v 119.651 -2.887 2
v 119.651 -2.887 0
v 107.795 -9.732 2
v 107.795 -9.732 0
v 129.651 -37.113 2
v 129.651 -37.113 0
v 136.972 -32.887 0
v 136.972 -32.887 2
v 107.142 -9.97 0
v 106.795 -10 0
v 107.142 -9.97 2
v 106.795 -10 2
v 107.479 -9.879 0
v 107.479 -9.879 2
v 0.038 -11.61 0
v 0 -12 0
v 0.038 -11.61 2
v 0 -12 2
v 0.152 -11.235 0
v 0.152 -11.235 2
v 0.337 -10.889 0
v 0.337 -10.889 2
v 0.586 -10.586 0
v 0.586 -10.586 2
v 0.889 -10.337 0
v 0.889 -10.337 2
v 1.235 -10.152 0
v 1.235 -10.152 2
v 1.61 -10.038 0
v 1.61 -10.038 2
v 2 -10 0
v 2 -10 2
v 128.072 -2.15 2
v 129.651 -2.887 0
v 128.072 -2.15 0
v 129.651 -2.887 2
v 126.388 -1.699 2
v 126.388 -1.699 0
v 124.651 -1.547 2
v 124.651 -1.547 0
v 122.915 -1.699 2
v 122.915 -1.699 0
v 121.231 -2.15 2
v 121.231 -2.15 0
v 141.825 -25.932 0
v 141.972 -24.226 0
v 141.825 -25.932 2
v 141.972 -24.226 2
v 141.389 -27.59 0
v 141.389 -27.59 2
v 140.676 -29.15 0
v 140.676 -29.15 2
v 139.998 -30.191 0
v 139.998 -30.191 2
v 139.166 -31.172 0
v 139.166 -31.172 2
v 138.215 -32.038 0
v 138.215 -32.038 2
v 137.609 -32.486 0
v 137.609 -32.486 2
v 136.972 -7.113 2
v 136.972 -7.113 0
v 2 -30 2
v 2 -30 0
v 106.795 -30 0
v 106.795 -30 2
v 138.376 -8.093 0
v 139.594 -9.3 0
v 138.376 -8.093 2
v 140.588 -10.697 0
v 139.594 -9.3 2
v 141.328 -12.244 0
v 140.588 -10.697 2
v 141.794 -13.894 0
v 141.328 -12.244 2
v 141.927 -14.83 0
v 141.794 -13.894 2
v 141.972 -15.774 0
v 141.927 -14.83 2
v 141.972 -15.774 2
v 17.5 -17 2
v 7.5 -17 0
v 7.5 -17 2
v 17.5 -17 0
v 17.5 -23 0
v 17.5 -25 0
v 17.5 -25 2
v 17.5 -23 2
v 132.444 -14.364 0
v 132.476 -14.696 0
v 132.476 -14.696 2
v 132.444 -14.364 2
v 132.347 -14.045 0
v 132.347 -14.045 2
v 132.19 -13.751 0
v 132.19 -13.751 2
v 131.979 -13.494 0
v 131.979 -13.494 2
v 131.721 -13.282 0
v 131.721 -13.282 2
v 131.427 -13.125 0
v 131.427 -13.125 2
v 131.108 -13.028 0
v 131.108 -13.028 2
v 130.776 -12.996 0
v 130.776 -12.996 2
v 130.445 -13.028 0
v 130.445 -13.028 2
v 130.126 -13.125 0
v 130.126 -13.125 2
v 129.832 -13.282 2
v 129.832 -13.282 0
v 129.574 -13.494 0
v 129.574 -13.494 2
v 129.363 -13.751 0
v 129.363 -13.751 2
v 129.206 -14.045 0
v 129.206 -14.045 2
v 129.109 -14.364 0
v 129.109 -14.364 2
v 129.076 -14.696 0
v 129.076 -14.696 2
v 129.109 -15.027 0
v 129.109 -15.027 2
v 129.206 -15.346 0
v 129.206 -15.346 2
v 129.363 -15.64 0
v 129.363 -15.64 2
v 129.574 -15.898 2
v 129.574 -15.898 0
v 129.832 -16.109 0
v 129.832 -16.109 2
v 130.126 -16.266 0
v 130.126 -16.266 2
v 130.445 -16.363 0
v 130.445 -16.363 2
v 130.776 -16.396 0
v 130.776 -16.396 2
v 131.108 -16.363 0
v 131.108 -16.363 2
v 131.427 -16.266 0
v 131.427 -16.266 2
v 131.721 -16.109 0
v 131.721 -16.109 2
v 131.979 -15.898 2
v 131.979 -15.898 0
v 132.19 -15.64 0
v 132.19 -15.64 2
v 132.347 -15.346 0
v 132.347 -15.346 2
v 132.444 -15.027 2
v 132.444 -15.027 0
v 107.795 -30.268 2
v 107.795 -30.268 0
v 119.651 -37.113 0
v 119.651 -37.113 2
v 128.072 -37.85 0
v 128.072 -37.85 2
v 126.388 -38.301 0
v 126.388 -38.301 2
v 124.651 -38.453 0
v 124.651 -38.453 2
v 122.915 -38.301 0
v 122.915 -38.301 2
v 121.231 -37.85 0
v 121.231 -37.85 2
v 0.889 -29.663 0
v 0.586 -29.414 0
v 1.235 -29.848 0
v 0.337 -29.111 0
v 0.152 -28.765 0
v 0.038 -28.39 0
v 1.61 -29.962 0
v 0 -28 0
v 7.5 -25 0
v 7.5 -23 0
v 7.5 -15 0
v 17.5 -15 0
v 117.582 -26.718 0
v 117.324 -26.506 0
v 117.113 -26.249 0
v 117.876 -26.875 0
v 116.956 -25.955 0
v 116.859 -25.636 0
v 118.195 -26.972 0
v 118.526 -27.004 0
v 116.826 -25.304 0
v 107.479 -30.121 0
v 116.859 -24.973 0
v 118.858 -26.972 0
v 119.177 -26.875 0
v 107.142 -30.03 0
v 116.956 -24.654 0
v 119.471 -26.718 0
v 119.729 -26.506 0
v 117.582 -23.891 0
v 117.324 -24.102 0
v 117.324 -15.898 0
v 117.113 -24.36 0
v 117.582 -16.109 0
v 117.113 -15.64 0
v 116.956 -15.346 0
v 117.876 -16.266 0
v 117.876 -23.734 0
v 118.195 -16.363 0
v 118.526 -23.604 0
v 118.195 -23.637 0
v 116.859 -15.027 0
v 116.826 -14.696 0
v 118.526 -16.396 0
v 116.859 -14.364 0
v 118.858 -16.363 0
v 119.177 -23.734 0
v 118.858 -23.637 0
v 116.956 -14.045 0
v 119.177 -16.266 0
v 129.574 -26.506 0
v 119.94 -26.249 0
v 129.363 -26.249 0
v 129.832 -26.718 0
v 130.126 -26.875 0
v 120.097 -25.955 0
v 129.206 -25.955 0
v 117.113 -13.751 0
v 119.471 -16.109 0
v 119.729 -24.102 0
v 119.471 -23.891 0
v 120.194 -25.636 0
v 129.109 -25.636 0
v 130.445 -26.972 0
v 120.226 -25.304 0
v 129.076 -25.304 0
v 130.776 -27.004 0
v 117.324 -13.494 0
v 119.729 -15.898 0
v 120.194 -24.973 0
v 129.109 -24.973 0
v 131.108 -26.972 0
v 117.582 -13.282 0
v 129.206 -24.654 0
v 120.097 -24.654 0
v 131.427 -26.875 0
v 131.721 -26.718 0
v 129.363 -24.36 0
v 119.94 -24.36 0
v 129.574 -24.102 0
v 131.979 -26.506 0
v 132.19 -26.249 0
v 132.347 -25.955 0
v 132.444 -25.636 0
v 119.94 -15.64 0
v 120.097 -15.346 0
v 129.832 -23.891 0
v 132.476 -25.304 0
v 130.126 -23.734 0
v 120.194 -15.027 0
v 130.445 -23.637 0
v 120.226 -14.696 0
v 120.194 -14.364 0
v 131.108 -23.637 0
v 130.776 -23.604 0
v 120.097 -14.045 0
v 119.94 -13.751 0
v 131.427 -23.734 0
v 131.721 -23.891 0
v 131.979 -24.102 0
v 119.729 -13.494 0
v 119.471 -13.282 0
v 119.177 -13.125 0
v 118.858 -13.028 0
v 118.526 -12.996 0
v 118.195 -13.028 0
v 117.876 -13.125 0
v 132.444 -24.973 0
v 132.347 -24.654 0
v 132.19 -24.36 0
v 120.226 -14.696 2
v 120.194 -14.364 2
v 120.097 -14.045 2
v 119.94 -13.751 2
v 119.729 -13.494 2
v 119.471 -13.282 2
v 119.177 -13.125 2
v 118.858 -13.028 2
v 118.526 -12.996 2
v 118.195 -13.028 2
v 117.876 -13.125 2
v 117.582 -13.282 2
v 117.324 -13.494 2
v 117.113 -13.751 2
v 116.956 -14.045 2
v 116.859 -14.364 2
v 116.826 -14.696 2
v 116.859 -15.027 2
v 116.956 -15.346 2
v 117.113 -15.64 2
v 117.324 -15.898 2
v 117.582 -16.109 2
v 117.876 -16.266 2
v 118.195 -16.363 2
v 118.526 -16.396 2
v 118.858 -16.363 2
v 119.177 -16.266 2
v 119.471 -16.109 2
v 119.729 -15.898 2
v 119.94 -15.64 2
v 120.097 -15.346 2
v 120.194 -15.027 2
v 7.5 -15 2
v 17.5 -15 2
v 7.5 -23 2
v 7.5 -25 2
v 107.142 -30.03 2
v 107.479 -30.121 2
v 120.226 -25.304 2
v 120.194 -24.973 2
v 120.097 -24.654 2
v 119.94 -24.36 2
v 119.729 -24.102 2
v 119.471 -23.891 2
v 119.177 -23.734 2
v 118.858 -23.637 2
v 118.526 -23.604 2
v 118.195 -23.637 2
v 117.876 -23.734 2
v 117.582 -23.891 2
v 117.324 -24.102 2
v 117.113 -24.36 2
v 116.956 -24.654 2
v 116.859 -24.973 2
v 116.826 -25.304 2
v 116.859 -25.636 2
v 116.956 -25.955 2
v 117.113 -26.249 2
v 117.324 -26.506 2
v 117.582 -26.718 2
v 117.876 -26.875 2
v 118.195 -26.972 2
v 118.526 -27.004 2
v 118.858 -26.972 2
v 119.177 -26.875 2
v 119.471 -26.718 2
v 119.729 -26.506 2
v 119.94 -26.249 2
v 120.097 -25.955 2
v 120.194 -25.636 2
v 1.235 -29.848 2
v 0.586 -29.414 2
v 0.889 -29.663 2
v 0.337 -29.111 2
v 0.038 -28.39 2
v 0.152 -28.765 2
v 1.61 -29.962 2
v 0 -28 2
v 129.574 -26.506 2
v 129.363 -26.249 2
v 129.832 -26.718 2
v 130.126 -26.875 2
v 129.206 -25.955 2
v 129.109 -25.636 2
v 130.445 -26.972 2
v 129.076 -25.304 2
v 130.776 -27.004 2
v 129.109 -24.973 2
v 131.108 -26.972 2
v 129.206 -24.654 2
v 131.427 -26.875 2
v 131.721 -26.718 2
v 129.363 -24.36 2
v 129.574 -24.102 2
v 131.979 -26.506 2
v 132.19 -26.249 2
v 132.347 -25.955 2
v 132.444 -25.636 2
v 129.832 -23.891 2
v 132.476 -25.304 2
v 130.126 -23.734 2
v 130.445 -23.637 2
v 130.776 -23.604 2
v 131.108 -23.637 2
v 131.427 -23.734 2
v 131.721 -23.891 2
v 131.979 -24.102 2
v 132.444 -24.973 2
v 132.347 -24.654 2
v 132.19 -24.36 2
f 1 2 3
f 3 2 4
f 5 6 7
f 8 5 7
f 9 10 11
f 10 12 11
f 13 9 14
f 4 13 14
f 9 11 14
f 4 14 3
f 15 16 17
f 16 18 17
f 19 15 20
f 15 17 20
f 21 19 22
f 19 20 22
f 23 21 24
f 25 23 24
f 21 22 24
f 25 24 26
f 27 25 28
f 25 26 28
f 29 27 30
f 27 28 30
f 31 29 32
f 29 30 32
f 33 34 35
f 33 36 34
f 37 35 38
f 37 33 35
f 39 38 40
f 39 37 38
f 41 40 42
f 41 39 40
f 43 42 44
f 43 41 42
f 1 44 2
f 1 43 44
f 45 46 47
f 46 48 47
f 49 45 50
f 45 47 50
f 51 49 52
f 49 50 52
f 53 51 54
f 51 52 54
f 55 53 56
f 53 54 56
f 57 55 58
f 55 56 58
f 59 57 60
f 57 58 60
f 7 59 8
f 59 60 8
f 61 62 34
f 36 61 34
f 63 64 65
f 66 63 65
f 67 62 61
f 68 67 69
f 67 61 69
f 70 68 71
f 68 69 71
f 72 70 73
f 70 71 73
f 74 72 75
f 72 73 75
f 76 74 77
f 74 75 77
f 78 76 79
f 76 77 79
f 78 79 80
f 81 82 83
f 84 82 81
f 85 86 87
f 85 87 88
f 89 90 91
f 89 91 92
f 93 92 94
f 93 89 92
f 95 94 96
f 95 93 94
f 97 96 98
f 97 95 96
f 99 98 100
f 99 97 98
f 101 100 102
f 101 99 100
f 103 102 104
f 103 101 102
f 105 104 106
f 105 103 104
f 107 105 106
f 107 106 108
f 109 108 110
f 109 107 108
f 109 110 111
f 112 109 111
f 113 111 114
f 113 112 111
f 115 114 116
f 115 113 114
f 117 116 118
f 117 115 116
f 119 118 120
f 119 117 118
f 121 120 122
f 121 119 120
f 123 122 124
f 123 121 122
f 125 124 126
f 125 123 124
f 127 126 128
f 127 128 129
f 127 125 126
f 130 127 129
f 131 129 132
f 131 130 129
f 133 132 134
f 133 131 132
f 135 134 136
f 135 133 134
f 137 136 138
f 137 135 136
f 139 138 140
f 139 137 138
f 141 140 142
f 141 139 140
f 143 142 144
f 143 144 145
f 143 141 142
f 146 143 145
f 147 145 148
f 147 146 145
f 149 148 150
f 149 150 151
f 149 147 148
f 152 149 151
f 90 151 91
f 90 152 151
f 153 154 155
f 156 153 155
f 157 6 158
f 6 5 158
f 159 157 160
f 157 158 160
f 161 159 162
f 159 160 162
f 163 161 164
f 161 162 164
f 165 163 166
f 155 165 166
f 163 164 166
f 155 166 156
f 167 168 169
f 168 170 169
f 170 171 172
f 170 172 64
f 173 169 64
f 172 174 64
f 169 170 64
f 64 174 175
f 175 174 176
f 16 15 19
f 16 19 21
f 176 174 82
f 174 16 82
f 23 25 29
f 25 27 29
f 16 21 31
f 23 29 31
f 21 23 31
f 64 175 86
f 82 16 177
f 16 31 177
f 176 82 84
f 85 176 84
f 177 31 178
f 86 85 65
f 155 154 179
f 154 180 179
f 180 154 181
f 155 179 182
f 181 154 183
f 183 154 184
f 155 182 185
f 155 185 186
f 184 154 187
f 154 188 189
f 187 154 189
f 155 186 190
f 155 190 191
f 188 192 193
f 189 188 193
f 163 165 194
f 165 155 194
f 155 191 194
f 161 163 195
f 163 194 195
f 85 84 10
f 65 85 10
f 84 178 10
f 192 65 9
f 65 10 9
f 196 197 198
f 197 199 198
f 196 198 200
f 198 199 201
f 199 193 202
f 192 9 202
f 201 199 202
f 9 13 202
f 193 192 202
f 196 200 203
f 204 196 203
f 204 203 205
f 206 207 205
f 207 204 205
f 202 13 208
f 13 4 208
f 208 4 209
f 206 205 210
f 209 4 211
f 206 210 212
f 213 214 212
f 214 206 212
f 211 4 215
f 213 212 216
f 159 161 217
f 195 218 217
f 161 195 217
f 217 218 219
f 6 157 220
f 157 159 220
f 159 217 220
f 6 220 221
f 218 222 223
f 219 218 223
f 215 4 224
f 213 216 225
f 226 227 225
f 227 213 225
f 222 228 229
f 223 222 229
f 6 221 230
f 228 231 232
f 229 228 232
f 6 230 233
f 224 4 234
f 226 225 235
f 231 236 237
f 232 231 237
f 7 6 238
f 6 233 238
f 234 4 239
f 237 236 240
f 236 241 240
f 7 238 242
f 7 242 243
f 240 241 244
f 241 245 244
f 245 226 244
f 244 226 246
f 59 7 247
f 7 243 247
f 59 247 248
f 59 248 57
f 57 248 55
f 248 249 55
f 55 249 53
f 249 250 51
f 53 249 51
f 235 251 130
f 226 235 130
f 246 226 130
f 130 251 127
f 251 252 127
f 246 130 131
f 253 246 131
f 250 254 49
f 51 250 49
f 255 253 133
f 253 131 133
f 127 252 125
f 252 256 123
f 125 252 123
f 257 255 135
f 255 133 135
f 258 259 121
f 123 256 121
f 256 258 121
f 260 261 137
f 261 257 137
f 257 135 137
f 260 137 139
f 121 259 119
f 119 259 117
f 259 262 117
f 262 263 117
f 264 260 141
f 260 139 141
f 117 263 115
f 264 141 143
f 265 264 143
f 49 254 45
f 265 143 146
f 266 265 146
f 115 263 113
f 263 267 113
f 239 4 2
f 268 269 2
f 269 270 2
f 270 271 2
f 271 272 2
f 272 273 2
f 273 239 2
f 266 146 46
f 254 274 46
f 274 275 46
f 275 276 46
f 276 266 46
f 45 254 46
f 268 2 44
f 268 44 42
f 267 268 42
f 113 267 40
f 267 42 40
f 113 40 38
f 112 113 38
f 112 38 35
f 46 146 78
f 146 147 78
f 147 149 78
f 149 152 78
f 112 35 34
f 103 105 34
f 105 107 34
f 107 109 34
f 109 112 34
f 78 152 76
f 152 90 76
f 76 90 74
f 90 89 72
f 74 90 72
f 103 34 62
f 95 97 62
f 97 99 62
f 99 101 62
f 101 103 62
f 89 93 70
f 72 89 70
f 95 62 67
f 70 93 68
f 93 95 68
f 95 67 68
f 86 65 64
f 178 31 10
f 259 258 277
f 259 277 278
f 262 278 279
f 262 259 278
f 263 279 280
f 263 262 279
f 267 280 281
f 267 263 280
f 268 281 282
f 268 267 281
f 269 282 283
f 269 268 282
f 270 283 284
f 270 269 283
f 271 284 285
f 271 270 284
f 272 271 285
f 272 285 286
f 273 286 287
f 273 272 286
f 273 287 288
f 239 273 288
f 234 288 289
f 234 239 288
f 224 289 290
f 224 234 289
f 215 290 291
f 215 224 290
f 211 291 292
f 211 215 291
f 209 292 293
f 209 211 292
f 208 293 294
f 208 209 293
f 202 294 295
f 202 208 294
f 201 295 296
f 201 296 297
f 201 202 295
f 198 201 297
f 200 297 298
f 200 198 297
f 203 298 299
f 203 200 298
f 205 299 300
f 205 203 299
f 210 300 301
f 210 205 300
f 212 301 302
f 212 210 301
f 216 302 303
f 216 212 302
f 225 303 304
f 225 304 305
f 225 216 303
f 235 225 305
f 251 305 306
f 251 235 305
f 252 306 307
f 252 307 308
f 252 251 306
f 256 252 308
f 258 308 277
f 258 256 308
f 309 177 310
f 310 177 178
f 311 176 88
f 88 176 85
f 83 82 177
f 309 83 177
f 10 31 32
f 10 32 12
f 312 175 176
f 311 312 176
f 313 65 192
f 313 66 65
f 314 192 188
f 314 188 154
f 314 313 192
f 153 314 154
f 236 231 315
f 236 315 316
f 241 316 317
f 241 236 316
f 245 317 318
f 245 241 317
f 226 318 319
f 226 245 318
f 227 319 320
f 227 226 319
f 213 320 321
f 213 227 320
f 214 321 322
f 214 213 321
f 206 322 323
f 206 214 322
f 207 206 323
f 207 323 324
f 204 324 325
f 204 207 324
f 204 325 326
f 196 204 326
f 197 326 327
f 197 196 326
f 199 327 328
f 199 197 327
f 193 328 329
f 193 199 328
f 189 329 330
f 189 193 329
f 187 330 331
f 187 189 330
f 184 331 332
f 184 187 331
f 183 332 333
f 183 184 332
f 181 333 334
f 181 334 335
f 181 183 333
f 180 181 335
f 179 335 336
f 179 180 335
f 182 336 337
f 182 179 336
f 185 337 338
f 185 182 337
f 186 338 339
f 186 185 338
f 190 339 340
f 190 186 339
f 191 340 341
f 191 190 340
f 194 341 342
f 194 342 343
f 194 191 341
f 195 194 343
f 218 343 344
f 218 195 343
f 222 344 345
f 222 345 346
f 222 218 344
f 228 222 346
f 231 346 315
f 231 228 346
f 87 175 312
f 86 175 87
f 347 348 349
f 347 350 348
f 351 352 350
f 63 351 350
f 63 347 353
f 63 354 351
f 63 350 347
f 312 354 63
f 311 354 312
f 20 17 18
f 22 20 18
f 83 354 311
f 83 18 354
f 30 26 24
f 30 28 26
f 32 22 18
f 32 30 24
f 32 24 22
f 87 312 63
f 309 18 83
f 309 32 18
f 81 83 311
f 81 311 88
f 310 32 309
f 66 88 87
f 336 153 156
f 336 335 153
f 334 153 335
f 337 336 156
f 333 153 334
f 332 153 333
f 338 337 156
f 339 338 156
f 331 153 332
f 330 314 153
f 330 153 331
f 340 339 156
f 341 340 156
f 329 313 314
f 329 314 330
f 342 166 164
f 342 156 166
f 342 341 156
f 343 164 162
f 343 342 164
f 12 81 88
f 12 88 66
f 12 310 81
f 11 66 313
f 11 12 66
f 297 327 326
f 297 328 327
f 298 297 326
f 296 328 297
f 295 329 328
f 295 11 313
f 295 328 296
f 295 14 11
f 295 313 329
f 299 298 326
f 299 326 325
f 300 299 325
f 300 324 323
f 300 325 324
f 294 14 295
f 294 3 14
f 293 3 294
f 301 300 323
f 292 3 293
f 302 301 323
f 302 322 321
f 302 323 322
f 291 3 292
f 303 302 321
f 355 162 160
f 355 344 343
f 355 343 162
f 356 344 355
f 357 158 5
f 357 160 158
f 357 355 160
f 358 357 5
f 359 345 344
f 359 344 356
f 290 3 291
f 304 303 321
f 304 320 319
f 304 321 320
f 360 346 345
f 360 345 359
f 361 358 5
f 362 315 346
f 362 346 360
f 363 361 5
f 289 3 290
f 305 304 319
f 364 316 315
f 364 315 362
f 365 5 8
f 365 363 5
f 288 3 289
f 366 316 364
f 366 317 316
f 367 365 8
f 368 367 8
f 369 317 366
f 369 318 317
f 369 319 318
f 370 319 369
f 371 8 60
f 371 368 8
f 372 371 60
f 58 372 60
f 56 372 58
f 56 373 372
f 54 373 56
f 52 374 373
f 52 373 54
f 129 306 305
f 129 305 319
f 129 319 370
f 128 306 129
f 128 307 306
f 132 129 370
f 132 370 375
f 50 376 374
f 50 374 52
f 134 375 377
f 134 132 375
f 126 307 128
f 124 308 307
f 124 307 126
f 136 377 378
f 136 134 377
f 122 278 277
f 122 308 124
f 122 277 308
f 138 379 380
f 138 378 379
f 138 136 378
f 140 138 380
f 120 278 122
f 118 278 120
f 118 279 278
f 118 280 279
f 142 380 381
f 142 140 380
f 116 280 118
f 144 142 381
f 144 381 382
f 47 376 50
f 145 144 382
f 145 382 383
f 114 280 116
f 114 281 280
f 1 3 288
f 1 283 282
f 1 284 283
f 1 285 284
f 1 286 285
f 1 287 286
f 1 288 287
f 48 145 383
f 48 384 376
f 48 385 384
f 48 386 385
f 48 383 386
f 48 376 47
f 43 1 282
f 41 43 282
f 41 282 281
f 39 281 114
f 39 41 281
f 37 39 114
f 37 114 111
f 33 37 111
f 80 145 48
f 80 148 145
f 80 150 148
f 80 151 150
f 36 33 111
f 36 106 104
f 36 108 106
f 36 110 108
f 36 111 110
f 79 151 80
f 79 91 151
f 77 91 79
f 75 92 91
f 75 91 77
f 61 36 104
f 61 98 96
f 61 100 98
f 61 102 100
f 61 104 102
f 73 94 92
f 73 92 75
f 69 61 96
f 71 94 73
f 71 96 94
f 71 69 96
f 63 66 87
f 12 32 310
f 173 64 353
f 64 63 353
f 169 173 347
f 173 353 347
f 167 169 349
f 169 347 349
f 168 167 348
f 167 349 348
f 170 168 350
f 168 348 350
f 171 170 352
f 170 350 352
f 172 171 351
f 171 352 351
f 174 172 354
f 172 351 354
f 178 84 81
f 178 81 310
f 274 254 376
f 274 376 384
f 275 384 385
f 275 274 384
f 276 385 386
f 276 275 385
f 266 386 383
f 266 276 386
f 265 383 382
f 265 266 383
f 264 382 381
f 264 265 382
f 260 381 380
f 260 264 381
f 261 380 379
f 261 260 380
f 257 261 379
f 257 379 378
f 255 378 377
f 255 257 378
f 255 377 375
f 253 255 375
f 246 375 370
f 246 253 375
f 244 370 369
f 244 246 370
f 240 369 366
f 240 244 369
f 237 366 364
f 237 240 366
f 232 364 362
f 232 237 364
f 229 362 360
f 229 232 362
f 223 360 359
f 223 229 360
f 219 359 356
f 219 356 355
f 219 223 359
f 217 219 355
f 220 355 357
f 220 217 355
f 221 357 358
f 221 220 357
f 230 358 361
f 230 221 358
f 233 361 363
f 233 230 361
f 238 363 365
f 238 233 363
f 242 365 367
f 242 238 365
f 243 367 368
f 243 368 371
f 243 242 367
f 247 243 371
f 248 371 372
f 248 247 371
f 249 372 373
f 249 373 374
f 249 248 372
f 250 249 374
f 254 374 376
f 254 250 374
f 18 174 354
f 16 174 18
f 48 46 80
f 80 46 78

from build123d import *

# Parameters (mm, degrees)
SKETCH1_W           = 107.330973451
SKETCH1_H           = 20
SKETCH1_W_2         = 10
SKETCH1_H_2         = 2
SKETCH1_R           = 12.25
SKETCH1_R_2         = 1.7
BOSS_EXTRUDE3_DEPTH = 2
FILLET5_R           = 10
FILLET6_R           = 10
FILLET7_R           = 10
FILLET8_R           = 10
FILLET14_R          = 2
FILLET15_R          = 2
FILLET16_R          = 2


with BuildPart() as part:
    # Sketch1 → Boss-Extrude3 (new body)
    # profile 1 of 4: a face of its own
    with BuildSketch(Plane.XY):
        with Locations((53.665486726, -20)):
            Rectangle(SKETCH1_W, SKETCH1_H)
        with Locations((12.5, -24)):
            Rectangle(SKETCH1_W_2, SKETCH1_H_2, mode=Mode.SUBTRACT)
        with Locations((12.5, -16)):
            Rectangle(SKETCH1_W_2, SKETCH1_H_2, mode=Mode.SUBTRACT)
    # profile 2 of 4: a face of its own
    with BuildSketch(Plane.XY):
        Polygon((140, -8.861471272), (124.651481526, 0), (107.330973451, -10), (107.330973451, -30), (124.651481526, -40), (140, -31.138528728), align=None)
        with Locations((124.651481526, -20)):
            Circle(SKETCH1_R, mode=Mode.SUBTRACT)
    # profile 3 of 4: a face of its own
    with BuildSketch(Plane.XY):
        with Locations((124.651481526, -20)):
            Circle(SKETCH1_R)
        with Locations((118.526481526, -25.304405598)):
            Circle(SKETCH1_R_2, mode=Mode.SUBTRACT)
        with Locations((130.776481526, -25.304405598)):
            Circle(SKETCH1_R_2, mode=Mode.SUBTRACT)
        with Locations((130.776481526, -14.695594402)):
            Circle(SKETCH1_R_2, mode=Mode.SUBTRACT)
        with Locations((118.526481526, -14.695594402)):
            Circle(SKETCH1_R_2, mode=Mode.SUBTRACT)
    # profile 4 of 4: a face of its own
    with BuildSketch(Plane.XY):
        Polygon((141.971989602, -10), (140, -8.861471272), (140, -31.138528728), (141.971989602, -30), align=None)
    extrude(amount=BOSS_EXTRUDE3_DEPTH)

    # Fillet5
    fillet5_edges = [part.edges().sort_by_distance(p)[0] for p in [
        (124.651481526, 0, 1),
    ]]
    fillet(fillet5_edges, radius=FILLET5_R)

    # Fillet6
    fillet6_edges = [part.edges().sort_by_distance(p)[0] for p in [
        (141.971989602, -10, 1),
    ]]
    fillet(fillet6_edges, radius=FILLET6_R)

    # Fillet7
    fillet7_edges = [part.edges().sort_by_distance(p)[0] for p in [
        (141.971989602, -30, 1),
    ]]
    fillet(fillet7_edges, radius=FILLET7_R)

    # Fillet8
    fillet8_edges = [part.edges().sort_by_distance(p)[0] for p in [
        (124.651481526, -40, 1),
    ]]
    fillet(fillet8_edges, radius=FILLET8_R)

    # Fillet14
    fillet14_edges = [part.edges().sort_by_distance(p)[0] for p in [
        (0, -30, 1),
        (0, -10, 1),
    ]]
    fillet(fillet14_edges, radius=FILLET14_R)

    # Fillet15
    fillet15_edges = [part.edges().sort_by_distance(p)[0] for p in [
        (107.330973451, -10, 1),
    ]]
    fillet(fillet15_edges, radius=FILLET15_R)

    # Fillet16
    fillet16_edges = [part.edges().sort_by_distance(p)[0] for p in [
        (107.330973451, -30, 1),
    ]]
    fillet(fillet16_edges, radius=FILLET16_R)


solid = part.part
